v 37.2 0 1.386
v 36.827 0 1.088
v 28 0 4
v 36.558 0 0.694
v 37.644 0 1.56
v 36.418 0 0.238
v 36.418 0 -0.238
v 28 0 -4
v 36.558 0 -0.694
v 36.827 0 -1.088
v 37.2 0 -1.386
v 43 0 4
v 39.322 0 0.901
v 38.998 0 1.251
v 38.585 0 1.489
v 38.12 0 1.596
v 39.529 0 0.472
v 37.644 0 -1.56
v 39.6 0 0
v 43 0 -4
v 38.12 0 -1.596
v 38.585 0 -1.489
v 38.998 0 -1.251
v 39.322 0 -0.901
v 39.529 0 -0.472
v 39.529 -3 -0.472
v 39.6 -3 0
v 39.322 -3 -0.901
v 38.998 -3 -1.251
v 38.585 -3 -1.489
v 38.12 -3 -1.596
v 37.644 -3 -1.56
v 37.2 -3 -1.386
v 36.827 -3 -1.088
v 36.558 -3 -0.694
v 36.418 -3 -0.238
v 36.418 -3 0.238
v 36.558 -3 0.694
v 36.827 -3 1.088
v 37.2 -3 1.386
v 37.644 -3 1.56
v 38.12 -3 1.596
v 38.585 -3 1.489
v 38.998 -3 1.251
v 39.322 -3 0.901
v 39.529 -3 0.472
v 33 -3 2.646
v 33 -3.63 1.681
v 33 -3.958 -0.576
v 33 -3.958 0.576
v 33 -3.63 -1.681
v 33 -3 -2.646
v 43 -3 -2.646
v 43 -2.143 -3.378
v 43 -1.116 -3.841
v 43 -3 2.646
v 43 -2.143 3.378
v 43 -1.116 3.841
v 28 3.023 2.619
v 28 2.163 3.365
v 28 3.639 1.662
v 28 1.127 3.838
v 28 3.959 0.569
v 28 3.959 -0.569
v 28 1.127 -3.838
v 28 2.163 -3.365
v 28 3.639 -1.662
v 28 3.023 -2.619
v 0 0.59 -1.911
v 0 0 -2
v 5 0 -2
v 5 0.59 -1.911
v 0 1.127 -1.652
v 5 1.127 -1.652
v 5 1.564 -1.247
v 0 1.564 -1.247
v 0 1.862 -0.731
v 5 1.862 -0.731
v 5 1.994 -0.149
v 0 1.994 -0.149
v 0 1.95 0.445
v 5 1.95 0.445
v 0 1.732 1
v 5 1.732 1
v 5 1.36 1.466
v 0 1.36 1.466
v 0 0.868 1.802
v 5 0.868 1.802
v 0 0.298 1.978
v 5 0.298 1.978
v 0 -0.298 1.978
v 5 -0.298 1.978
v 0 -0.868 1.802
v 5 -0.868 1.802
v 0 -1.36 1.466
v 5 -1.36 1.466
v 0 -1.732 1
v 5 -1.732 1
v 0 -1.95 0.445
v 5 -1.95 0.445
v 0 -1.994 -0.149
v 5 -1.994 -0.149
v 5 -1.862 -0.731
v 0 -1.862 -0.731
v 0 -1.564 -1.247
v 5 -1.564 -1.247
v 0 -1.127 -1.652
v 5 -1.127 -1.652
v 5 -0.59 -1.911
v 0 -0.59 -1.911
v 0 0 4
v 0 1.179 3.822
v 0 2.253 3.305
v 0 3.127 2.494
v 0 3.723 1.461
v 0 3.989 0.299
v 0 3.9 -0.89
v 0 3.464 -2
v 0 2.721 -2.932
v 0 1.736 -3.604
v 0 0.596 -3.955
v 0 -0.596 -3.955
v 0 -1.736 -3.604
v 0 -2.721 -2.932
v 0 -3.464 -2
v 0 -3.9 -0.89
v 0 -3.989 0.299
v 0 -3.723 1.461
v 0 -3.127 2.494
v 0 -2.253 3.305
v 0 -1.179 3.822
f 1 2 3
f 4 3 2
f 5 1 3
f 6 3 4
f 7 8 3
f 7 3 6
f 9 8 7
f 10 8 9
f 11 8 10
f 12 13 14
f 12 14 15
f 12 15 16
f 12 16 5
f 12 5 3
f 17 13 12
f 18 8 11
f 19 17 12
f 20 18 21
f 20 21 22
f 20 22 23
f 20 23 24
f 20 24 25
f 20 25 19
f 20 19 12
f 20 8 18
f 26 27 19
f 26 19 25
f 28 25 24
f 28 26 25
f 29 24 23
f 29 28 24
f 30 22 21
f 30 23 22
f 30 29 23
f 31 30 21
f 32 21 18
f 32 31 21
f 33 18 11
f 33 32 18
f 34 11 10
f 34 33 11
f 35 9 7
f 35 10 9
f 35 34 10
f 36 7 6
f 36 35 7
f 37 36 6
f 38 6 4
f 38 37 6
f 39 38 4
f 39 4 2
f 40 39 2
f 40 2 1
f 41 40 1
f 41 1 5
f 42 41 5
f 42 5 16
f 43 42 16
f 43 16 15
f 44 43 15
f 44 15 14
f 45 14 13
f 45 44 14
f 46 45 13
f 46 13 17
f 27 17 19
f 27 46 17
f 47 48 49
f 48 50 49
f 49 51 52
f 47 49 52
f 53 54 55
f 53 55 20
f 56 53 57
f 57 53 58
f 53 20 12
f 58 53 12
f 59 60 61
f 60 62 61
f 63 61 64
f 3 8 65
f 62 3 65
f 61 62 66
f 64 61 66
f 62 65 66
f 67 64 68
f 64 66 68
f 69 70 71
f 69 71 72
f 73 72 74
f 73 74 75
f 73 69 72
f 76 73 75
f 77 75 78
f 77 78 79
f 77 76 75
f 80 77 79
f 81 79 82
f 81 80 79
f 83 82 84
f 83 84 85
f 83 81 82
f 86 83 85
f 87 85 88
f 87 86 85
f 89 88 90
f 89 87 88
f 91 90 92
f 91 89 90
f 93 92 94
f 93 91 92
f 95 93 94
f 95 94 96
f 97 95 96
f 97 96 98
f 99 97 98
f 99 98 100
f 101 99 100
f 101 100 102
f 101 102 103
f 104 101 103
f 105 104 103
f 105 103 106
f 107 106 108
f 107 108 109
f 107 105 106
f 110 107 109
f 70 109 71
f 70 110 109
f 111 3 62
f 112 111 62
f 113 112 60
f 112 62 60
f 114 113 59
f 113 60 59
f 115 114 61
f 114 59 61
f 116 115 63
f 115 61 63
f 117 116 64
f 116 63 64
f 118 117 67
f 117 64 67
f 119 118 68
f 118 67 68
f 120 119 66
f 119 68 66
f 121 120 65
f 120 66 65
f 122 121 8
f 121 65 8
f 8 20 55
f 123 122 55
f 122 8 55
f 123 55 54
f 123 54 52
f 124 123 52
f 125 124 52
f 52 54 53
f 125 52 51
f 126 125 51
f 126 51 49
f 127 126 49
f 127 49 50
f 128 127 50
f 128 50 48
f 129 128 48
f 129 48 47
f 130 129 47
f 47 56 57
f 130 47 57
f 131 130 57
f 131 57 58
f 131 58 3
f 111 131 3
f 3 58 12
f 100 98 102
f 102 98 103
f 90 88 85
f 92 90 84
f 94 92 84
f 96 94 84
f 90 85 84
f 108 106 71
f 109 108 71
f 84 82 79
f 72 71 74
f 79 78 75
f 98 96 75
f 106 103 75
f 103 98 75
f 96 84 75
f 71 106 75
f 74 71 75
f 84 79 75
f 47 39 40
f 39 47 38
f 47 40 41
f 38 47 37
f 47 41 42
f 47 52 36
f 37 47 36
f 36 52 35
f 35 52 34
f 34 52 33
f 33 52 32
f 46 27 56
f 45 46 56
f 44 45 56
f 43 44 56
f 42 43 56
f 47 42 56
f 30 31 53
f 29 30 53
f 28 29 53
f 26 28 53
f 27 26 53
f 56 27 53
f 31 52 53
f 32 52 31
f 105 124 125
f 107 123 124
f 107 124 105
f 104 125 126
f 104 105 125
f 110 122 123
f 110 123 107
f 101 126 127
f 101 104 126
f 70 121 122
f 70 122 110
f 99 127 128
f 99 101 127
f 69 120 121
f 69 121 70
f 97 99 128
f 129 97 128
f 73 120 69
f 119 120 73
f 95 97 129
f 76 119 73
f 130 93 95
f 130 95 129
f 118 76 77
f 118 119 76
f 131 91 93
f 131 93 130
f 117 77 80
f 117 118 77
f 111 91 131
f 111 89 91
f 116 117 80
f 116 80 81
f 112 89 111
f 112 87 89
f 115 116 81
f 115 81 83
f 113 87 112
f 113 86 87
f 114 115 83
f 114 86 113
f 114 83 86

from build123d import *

# Parameters (mm, degrees)
CYLINDER026_R     = 2
CYLINDER026_DEPTH = 5
CYLINDER_R        = 1.6
CYLINDER_DEPTH    = 5
BOX001_W          = 10
BOX001_H          = 10
BOX001_DEPTH      = 10
BOX_W             = 15
BOX_H             = 10
BOX_DEPTH         = 10
CYLINDER025_R     = 4
CYLINDER025_DEPTH = 43


with BuildPart() as cylinder001:
    # Cylinder026 → Cylinder026 (new body)
    with BuildSketch(Plane(origin=(0, 0, 0), x_dir=(0, 0, -1), z_dir=(1, 0, 0))):
        Circle(CYLINDER026_R)
    extrude(amount=CYLINDER026_DEPTH)


with BuildPart() as cylinder:
    # Cylinder → Cylinder (new body)
    with BuildSketch(Plane(origin=(38, -4, 0), x_dir=(1, 0, 0), z_dir=(0, 1, 0))):
        Circle(CYLINDER_R)
    extrude(amount=CYLINDER_DEPTH)


with BuildPart() as cube001:
    # Box001 → Box001 (new body)
    with BuildSketch(Plane(origin=(33, -13, -5), x_dir=(1, 0, 0), z_dir=(0, 0, 1))):
        with Locations((5, 5)):
            Rectangle(BOX001_W, BOX001_H)
    extrude(amount=BOX001_DEPTH)


with BuildPart() as cube:
    # Box → Box (new body)
    with BuildSketch(Plane(origin=(28, 0, -5), x_dir=(1, 0, 0), z_dir=(0, 0, 1))):
        with Locations((7.5, 5)):
            Rectangle(BOX_W, BOX_H)
    extrude(amount=BOX_DEPTH)


with BuildPart() as piston:
    # Cylinder025 → Cylinder025 (new body)
    with BuildSketch(Plane.ZY.offset(-43)):
        Circle(CYLINDER025_R)
    extrude(amount=CYLINDER025_DEPTH)

    # Cut: cut Cube
    add(cube.part, mode=Mode.SUBTRACT)

    # Cut001: cut Cube001
    add(cube001.part, mode=Mode.SUBTRACT)

    # Cut002: cut Cylinder
    add(cylinder.part, mode=Mode.SUBTRACT)

    # Cut003: cut Cylinder001
    add(cylinder001.part, mode=Mode.SUBTRACT)


solid = piston.part
